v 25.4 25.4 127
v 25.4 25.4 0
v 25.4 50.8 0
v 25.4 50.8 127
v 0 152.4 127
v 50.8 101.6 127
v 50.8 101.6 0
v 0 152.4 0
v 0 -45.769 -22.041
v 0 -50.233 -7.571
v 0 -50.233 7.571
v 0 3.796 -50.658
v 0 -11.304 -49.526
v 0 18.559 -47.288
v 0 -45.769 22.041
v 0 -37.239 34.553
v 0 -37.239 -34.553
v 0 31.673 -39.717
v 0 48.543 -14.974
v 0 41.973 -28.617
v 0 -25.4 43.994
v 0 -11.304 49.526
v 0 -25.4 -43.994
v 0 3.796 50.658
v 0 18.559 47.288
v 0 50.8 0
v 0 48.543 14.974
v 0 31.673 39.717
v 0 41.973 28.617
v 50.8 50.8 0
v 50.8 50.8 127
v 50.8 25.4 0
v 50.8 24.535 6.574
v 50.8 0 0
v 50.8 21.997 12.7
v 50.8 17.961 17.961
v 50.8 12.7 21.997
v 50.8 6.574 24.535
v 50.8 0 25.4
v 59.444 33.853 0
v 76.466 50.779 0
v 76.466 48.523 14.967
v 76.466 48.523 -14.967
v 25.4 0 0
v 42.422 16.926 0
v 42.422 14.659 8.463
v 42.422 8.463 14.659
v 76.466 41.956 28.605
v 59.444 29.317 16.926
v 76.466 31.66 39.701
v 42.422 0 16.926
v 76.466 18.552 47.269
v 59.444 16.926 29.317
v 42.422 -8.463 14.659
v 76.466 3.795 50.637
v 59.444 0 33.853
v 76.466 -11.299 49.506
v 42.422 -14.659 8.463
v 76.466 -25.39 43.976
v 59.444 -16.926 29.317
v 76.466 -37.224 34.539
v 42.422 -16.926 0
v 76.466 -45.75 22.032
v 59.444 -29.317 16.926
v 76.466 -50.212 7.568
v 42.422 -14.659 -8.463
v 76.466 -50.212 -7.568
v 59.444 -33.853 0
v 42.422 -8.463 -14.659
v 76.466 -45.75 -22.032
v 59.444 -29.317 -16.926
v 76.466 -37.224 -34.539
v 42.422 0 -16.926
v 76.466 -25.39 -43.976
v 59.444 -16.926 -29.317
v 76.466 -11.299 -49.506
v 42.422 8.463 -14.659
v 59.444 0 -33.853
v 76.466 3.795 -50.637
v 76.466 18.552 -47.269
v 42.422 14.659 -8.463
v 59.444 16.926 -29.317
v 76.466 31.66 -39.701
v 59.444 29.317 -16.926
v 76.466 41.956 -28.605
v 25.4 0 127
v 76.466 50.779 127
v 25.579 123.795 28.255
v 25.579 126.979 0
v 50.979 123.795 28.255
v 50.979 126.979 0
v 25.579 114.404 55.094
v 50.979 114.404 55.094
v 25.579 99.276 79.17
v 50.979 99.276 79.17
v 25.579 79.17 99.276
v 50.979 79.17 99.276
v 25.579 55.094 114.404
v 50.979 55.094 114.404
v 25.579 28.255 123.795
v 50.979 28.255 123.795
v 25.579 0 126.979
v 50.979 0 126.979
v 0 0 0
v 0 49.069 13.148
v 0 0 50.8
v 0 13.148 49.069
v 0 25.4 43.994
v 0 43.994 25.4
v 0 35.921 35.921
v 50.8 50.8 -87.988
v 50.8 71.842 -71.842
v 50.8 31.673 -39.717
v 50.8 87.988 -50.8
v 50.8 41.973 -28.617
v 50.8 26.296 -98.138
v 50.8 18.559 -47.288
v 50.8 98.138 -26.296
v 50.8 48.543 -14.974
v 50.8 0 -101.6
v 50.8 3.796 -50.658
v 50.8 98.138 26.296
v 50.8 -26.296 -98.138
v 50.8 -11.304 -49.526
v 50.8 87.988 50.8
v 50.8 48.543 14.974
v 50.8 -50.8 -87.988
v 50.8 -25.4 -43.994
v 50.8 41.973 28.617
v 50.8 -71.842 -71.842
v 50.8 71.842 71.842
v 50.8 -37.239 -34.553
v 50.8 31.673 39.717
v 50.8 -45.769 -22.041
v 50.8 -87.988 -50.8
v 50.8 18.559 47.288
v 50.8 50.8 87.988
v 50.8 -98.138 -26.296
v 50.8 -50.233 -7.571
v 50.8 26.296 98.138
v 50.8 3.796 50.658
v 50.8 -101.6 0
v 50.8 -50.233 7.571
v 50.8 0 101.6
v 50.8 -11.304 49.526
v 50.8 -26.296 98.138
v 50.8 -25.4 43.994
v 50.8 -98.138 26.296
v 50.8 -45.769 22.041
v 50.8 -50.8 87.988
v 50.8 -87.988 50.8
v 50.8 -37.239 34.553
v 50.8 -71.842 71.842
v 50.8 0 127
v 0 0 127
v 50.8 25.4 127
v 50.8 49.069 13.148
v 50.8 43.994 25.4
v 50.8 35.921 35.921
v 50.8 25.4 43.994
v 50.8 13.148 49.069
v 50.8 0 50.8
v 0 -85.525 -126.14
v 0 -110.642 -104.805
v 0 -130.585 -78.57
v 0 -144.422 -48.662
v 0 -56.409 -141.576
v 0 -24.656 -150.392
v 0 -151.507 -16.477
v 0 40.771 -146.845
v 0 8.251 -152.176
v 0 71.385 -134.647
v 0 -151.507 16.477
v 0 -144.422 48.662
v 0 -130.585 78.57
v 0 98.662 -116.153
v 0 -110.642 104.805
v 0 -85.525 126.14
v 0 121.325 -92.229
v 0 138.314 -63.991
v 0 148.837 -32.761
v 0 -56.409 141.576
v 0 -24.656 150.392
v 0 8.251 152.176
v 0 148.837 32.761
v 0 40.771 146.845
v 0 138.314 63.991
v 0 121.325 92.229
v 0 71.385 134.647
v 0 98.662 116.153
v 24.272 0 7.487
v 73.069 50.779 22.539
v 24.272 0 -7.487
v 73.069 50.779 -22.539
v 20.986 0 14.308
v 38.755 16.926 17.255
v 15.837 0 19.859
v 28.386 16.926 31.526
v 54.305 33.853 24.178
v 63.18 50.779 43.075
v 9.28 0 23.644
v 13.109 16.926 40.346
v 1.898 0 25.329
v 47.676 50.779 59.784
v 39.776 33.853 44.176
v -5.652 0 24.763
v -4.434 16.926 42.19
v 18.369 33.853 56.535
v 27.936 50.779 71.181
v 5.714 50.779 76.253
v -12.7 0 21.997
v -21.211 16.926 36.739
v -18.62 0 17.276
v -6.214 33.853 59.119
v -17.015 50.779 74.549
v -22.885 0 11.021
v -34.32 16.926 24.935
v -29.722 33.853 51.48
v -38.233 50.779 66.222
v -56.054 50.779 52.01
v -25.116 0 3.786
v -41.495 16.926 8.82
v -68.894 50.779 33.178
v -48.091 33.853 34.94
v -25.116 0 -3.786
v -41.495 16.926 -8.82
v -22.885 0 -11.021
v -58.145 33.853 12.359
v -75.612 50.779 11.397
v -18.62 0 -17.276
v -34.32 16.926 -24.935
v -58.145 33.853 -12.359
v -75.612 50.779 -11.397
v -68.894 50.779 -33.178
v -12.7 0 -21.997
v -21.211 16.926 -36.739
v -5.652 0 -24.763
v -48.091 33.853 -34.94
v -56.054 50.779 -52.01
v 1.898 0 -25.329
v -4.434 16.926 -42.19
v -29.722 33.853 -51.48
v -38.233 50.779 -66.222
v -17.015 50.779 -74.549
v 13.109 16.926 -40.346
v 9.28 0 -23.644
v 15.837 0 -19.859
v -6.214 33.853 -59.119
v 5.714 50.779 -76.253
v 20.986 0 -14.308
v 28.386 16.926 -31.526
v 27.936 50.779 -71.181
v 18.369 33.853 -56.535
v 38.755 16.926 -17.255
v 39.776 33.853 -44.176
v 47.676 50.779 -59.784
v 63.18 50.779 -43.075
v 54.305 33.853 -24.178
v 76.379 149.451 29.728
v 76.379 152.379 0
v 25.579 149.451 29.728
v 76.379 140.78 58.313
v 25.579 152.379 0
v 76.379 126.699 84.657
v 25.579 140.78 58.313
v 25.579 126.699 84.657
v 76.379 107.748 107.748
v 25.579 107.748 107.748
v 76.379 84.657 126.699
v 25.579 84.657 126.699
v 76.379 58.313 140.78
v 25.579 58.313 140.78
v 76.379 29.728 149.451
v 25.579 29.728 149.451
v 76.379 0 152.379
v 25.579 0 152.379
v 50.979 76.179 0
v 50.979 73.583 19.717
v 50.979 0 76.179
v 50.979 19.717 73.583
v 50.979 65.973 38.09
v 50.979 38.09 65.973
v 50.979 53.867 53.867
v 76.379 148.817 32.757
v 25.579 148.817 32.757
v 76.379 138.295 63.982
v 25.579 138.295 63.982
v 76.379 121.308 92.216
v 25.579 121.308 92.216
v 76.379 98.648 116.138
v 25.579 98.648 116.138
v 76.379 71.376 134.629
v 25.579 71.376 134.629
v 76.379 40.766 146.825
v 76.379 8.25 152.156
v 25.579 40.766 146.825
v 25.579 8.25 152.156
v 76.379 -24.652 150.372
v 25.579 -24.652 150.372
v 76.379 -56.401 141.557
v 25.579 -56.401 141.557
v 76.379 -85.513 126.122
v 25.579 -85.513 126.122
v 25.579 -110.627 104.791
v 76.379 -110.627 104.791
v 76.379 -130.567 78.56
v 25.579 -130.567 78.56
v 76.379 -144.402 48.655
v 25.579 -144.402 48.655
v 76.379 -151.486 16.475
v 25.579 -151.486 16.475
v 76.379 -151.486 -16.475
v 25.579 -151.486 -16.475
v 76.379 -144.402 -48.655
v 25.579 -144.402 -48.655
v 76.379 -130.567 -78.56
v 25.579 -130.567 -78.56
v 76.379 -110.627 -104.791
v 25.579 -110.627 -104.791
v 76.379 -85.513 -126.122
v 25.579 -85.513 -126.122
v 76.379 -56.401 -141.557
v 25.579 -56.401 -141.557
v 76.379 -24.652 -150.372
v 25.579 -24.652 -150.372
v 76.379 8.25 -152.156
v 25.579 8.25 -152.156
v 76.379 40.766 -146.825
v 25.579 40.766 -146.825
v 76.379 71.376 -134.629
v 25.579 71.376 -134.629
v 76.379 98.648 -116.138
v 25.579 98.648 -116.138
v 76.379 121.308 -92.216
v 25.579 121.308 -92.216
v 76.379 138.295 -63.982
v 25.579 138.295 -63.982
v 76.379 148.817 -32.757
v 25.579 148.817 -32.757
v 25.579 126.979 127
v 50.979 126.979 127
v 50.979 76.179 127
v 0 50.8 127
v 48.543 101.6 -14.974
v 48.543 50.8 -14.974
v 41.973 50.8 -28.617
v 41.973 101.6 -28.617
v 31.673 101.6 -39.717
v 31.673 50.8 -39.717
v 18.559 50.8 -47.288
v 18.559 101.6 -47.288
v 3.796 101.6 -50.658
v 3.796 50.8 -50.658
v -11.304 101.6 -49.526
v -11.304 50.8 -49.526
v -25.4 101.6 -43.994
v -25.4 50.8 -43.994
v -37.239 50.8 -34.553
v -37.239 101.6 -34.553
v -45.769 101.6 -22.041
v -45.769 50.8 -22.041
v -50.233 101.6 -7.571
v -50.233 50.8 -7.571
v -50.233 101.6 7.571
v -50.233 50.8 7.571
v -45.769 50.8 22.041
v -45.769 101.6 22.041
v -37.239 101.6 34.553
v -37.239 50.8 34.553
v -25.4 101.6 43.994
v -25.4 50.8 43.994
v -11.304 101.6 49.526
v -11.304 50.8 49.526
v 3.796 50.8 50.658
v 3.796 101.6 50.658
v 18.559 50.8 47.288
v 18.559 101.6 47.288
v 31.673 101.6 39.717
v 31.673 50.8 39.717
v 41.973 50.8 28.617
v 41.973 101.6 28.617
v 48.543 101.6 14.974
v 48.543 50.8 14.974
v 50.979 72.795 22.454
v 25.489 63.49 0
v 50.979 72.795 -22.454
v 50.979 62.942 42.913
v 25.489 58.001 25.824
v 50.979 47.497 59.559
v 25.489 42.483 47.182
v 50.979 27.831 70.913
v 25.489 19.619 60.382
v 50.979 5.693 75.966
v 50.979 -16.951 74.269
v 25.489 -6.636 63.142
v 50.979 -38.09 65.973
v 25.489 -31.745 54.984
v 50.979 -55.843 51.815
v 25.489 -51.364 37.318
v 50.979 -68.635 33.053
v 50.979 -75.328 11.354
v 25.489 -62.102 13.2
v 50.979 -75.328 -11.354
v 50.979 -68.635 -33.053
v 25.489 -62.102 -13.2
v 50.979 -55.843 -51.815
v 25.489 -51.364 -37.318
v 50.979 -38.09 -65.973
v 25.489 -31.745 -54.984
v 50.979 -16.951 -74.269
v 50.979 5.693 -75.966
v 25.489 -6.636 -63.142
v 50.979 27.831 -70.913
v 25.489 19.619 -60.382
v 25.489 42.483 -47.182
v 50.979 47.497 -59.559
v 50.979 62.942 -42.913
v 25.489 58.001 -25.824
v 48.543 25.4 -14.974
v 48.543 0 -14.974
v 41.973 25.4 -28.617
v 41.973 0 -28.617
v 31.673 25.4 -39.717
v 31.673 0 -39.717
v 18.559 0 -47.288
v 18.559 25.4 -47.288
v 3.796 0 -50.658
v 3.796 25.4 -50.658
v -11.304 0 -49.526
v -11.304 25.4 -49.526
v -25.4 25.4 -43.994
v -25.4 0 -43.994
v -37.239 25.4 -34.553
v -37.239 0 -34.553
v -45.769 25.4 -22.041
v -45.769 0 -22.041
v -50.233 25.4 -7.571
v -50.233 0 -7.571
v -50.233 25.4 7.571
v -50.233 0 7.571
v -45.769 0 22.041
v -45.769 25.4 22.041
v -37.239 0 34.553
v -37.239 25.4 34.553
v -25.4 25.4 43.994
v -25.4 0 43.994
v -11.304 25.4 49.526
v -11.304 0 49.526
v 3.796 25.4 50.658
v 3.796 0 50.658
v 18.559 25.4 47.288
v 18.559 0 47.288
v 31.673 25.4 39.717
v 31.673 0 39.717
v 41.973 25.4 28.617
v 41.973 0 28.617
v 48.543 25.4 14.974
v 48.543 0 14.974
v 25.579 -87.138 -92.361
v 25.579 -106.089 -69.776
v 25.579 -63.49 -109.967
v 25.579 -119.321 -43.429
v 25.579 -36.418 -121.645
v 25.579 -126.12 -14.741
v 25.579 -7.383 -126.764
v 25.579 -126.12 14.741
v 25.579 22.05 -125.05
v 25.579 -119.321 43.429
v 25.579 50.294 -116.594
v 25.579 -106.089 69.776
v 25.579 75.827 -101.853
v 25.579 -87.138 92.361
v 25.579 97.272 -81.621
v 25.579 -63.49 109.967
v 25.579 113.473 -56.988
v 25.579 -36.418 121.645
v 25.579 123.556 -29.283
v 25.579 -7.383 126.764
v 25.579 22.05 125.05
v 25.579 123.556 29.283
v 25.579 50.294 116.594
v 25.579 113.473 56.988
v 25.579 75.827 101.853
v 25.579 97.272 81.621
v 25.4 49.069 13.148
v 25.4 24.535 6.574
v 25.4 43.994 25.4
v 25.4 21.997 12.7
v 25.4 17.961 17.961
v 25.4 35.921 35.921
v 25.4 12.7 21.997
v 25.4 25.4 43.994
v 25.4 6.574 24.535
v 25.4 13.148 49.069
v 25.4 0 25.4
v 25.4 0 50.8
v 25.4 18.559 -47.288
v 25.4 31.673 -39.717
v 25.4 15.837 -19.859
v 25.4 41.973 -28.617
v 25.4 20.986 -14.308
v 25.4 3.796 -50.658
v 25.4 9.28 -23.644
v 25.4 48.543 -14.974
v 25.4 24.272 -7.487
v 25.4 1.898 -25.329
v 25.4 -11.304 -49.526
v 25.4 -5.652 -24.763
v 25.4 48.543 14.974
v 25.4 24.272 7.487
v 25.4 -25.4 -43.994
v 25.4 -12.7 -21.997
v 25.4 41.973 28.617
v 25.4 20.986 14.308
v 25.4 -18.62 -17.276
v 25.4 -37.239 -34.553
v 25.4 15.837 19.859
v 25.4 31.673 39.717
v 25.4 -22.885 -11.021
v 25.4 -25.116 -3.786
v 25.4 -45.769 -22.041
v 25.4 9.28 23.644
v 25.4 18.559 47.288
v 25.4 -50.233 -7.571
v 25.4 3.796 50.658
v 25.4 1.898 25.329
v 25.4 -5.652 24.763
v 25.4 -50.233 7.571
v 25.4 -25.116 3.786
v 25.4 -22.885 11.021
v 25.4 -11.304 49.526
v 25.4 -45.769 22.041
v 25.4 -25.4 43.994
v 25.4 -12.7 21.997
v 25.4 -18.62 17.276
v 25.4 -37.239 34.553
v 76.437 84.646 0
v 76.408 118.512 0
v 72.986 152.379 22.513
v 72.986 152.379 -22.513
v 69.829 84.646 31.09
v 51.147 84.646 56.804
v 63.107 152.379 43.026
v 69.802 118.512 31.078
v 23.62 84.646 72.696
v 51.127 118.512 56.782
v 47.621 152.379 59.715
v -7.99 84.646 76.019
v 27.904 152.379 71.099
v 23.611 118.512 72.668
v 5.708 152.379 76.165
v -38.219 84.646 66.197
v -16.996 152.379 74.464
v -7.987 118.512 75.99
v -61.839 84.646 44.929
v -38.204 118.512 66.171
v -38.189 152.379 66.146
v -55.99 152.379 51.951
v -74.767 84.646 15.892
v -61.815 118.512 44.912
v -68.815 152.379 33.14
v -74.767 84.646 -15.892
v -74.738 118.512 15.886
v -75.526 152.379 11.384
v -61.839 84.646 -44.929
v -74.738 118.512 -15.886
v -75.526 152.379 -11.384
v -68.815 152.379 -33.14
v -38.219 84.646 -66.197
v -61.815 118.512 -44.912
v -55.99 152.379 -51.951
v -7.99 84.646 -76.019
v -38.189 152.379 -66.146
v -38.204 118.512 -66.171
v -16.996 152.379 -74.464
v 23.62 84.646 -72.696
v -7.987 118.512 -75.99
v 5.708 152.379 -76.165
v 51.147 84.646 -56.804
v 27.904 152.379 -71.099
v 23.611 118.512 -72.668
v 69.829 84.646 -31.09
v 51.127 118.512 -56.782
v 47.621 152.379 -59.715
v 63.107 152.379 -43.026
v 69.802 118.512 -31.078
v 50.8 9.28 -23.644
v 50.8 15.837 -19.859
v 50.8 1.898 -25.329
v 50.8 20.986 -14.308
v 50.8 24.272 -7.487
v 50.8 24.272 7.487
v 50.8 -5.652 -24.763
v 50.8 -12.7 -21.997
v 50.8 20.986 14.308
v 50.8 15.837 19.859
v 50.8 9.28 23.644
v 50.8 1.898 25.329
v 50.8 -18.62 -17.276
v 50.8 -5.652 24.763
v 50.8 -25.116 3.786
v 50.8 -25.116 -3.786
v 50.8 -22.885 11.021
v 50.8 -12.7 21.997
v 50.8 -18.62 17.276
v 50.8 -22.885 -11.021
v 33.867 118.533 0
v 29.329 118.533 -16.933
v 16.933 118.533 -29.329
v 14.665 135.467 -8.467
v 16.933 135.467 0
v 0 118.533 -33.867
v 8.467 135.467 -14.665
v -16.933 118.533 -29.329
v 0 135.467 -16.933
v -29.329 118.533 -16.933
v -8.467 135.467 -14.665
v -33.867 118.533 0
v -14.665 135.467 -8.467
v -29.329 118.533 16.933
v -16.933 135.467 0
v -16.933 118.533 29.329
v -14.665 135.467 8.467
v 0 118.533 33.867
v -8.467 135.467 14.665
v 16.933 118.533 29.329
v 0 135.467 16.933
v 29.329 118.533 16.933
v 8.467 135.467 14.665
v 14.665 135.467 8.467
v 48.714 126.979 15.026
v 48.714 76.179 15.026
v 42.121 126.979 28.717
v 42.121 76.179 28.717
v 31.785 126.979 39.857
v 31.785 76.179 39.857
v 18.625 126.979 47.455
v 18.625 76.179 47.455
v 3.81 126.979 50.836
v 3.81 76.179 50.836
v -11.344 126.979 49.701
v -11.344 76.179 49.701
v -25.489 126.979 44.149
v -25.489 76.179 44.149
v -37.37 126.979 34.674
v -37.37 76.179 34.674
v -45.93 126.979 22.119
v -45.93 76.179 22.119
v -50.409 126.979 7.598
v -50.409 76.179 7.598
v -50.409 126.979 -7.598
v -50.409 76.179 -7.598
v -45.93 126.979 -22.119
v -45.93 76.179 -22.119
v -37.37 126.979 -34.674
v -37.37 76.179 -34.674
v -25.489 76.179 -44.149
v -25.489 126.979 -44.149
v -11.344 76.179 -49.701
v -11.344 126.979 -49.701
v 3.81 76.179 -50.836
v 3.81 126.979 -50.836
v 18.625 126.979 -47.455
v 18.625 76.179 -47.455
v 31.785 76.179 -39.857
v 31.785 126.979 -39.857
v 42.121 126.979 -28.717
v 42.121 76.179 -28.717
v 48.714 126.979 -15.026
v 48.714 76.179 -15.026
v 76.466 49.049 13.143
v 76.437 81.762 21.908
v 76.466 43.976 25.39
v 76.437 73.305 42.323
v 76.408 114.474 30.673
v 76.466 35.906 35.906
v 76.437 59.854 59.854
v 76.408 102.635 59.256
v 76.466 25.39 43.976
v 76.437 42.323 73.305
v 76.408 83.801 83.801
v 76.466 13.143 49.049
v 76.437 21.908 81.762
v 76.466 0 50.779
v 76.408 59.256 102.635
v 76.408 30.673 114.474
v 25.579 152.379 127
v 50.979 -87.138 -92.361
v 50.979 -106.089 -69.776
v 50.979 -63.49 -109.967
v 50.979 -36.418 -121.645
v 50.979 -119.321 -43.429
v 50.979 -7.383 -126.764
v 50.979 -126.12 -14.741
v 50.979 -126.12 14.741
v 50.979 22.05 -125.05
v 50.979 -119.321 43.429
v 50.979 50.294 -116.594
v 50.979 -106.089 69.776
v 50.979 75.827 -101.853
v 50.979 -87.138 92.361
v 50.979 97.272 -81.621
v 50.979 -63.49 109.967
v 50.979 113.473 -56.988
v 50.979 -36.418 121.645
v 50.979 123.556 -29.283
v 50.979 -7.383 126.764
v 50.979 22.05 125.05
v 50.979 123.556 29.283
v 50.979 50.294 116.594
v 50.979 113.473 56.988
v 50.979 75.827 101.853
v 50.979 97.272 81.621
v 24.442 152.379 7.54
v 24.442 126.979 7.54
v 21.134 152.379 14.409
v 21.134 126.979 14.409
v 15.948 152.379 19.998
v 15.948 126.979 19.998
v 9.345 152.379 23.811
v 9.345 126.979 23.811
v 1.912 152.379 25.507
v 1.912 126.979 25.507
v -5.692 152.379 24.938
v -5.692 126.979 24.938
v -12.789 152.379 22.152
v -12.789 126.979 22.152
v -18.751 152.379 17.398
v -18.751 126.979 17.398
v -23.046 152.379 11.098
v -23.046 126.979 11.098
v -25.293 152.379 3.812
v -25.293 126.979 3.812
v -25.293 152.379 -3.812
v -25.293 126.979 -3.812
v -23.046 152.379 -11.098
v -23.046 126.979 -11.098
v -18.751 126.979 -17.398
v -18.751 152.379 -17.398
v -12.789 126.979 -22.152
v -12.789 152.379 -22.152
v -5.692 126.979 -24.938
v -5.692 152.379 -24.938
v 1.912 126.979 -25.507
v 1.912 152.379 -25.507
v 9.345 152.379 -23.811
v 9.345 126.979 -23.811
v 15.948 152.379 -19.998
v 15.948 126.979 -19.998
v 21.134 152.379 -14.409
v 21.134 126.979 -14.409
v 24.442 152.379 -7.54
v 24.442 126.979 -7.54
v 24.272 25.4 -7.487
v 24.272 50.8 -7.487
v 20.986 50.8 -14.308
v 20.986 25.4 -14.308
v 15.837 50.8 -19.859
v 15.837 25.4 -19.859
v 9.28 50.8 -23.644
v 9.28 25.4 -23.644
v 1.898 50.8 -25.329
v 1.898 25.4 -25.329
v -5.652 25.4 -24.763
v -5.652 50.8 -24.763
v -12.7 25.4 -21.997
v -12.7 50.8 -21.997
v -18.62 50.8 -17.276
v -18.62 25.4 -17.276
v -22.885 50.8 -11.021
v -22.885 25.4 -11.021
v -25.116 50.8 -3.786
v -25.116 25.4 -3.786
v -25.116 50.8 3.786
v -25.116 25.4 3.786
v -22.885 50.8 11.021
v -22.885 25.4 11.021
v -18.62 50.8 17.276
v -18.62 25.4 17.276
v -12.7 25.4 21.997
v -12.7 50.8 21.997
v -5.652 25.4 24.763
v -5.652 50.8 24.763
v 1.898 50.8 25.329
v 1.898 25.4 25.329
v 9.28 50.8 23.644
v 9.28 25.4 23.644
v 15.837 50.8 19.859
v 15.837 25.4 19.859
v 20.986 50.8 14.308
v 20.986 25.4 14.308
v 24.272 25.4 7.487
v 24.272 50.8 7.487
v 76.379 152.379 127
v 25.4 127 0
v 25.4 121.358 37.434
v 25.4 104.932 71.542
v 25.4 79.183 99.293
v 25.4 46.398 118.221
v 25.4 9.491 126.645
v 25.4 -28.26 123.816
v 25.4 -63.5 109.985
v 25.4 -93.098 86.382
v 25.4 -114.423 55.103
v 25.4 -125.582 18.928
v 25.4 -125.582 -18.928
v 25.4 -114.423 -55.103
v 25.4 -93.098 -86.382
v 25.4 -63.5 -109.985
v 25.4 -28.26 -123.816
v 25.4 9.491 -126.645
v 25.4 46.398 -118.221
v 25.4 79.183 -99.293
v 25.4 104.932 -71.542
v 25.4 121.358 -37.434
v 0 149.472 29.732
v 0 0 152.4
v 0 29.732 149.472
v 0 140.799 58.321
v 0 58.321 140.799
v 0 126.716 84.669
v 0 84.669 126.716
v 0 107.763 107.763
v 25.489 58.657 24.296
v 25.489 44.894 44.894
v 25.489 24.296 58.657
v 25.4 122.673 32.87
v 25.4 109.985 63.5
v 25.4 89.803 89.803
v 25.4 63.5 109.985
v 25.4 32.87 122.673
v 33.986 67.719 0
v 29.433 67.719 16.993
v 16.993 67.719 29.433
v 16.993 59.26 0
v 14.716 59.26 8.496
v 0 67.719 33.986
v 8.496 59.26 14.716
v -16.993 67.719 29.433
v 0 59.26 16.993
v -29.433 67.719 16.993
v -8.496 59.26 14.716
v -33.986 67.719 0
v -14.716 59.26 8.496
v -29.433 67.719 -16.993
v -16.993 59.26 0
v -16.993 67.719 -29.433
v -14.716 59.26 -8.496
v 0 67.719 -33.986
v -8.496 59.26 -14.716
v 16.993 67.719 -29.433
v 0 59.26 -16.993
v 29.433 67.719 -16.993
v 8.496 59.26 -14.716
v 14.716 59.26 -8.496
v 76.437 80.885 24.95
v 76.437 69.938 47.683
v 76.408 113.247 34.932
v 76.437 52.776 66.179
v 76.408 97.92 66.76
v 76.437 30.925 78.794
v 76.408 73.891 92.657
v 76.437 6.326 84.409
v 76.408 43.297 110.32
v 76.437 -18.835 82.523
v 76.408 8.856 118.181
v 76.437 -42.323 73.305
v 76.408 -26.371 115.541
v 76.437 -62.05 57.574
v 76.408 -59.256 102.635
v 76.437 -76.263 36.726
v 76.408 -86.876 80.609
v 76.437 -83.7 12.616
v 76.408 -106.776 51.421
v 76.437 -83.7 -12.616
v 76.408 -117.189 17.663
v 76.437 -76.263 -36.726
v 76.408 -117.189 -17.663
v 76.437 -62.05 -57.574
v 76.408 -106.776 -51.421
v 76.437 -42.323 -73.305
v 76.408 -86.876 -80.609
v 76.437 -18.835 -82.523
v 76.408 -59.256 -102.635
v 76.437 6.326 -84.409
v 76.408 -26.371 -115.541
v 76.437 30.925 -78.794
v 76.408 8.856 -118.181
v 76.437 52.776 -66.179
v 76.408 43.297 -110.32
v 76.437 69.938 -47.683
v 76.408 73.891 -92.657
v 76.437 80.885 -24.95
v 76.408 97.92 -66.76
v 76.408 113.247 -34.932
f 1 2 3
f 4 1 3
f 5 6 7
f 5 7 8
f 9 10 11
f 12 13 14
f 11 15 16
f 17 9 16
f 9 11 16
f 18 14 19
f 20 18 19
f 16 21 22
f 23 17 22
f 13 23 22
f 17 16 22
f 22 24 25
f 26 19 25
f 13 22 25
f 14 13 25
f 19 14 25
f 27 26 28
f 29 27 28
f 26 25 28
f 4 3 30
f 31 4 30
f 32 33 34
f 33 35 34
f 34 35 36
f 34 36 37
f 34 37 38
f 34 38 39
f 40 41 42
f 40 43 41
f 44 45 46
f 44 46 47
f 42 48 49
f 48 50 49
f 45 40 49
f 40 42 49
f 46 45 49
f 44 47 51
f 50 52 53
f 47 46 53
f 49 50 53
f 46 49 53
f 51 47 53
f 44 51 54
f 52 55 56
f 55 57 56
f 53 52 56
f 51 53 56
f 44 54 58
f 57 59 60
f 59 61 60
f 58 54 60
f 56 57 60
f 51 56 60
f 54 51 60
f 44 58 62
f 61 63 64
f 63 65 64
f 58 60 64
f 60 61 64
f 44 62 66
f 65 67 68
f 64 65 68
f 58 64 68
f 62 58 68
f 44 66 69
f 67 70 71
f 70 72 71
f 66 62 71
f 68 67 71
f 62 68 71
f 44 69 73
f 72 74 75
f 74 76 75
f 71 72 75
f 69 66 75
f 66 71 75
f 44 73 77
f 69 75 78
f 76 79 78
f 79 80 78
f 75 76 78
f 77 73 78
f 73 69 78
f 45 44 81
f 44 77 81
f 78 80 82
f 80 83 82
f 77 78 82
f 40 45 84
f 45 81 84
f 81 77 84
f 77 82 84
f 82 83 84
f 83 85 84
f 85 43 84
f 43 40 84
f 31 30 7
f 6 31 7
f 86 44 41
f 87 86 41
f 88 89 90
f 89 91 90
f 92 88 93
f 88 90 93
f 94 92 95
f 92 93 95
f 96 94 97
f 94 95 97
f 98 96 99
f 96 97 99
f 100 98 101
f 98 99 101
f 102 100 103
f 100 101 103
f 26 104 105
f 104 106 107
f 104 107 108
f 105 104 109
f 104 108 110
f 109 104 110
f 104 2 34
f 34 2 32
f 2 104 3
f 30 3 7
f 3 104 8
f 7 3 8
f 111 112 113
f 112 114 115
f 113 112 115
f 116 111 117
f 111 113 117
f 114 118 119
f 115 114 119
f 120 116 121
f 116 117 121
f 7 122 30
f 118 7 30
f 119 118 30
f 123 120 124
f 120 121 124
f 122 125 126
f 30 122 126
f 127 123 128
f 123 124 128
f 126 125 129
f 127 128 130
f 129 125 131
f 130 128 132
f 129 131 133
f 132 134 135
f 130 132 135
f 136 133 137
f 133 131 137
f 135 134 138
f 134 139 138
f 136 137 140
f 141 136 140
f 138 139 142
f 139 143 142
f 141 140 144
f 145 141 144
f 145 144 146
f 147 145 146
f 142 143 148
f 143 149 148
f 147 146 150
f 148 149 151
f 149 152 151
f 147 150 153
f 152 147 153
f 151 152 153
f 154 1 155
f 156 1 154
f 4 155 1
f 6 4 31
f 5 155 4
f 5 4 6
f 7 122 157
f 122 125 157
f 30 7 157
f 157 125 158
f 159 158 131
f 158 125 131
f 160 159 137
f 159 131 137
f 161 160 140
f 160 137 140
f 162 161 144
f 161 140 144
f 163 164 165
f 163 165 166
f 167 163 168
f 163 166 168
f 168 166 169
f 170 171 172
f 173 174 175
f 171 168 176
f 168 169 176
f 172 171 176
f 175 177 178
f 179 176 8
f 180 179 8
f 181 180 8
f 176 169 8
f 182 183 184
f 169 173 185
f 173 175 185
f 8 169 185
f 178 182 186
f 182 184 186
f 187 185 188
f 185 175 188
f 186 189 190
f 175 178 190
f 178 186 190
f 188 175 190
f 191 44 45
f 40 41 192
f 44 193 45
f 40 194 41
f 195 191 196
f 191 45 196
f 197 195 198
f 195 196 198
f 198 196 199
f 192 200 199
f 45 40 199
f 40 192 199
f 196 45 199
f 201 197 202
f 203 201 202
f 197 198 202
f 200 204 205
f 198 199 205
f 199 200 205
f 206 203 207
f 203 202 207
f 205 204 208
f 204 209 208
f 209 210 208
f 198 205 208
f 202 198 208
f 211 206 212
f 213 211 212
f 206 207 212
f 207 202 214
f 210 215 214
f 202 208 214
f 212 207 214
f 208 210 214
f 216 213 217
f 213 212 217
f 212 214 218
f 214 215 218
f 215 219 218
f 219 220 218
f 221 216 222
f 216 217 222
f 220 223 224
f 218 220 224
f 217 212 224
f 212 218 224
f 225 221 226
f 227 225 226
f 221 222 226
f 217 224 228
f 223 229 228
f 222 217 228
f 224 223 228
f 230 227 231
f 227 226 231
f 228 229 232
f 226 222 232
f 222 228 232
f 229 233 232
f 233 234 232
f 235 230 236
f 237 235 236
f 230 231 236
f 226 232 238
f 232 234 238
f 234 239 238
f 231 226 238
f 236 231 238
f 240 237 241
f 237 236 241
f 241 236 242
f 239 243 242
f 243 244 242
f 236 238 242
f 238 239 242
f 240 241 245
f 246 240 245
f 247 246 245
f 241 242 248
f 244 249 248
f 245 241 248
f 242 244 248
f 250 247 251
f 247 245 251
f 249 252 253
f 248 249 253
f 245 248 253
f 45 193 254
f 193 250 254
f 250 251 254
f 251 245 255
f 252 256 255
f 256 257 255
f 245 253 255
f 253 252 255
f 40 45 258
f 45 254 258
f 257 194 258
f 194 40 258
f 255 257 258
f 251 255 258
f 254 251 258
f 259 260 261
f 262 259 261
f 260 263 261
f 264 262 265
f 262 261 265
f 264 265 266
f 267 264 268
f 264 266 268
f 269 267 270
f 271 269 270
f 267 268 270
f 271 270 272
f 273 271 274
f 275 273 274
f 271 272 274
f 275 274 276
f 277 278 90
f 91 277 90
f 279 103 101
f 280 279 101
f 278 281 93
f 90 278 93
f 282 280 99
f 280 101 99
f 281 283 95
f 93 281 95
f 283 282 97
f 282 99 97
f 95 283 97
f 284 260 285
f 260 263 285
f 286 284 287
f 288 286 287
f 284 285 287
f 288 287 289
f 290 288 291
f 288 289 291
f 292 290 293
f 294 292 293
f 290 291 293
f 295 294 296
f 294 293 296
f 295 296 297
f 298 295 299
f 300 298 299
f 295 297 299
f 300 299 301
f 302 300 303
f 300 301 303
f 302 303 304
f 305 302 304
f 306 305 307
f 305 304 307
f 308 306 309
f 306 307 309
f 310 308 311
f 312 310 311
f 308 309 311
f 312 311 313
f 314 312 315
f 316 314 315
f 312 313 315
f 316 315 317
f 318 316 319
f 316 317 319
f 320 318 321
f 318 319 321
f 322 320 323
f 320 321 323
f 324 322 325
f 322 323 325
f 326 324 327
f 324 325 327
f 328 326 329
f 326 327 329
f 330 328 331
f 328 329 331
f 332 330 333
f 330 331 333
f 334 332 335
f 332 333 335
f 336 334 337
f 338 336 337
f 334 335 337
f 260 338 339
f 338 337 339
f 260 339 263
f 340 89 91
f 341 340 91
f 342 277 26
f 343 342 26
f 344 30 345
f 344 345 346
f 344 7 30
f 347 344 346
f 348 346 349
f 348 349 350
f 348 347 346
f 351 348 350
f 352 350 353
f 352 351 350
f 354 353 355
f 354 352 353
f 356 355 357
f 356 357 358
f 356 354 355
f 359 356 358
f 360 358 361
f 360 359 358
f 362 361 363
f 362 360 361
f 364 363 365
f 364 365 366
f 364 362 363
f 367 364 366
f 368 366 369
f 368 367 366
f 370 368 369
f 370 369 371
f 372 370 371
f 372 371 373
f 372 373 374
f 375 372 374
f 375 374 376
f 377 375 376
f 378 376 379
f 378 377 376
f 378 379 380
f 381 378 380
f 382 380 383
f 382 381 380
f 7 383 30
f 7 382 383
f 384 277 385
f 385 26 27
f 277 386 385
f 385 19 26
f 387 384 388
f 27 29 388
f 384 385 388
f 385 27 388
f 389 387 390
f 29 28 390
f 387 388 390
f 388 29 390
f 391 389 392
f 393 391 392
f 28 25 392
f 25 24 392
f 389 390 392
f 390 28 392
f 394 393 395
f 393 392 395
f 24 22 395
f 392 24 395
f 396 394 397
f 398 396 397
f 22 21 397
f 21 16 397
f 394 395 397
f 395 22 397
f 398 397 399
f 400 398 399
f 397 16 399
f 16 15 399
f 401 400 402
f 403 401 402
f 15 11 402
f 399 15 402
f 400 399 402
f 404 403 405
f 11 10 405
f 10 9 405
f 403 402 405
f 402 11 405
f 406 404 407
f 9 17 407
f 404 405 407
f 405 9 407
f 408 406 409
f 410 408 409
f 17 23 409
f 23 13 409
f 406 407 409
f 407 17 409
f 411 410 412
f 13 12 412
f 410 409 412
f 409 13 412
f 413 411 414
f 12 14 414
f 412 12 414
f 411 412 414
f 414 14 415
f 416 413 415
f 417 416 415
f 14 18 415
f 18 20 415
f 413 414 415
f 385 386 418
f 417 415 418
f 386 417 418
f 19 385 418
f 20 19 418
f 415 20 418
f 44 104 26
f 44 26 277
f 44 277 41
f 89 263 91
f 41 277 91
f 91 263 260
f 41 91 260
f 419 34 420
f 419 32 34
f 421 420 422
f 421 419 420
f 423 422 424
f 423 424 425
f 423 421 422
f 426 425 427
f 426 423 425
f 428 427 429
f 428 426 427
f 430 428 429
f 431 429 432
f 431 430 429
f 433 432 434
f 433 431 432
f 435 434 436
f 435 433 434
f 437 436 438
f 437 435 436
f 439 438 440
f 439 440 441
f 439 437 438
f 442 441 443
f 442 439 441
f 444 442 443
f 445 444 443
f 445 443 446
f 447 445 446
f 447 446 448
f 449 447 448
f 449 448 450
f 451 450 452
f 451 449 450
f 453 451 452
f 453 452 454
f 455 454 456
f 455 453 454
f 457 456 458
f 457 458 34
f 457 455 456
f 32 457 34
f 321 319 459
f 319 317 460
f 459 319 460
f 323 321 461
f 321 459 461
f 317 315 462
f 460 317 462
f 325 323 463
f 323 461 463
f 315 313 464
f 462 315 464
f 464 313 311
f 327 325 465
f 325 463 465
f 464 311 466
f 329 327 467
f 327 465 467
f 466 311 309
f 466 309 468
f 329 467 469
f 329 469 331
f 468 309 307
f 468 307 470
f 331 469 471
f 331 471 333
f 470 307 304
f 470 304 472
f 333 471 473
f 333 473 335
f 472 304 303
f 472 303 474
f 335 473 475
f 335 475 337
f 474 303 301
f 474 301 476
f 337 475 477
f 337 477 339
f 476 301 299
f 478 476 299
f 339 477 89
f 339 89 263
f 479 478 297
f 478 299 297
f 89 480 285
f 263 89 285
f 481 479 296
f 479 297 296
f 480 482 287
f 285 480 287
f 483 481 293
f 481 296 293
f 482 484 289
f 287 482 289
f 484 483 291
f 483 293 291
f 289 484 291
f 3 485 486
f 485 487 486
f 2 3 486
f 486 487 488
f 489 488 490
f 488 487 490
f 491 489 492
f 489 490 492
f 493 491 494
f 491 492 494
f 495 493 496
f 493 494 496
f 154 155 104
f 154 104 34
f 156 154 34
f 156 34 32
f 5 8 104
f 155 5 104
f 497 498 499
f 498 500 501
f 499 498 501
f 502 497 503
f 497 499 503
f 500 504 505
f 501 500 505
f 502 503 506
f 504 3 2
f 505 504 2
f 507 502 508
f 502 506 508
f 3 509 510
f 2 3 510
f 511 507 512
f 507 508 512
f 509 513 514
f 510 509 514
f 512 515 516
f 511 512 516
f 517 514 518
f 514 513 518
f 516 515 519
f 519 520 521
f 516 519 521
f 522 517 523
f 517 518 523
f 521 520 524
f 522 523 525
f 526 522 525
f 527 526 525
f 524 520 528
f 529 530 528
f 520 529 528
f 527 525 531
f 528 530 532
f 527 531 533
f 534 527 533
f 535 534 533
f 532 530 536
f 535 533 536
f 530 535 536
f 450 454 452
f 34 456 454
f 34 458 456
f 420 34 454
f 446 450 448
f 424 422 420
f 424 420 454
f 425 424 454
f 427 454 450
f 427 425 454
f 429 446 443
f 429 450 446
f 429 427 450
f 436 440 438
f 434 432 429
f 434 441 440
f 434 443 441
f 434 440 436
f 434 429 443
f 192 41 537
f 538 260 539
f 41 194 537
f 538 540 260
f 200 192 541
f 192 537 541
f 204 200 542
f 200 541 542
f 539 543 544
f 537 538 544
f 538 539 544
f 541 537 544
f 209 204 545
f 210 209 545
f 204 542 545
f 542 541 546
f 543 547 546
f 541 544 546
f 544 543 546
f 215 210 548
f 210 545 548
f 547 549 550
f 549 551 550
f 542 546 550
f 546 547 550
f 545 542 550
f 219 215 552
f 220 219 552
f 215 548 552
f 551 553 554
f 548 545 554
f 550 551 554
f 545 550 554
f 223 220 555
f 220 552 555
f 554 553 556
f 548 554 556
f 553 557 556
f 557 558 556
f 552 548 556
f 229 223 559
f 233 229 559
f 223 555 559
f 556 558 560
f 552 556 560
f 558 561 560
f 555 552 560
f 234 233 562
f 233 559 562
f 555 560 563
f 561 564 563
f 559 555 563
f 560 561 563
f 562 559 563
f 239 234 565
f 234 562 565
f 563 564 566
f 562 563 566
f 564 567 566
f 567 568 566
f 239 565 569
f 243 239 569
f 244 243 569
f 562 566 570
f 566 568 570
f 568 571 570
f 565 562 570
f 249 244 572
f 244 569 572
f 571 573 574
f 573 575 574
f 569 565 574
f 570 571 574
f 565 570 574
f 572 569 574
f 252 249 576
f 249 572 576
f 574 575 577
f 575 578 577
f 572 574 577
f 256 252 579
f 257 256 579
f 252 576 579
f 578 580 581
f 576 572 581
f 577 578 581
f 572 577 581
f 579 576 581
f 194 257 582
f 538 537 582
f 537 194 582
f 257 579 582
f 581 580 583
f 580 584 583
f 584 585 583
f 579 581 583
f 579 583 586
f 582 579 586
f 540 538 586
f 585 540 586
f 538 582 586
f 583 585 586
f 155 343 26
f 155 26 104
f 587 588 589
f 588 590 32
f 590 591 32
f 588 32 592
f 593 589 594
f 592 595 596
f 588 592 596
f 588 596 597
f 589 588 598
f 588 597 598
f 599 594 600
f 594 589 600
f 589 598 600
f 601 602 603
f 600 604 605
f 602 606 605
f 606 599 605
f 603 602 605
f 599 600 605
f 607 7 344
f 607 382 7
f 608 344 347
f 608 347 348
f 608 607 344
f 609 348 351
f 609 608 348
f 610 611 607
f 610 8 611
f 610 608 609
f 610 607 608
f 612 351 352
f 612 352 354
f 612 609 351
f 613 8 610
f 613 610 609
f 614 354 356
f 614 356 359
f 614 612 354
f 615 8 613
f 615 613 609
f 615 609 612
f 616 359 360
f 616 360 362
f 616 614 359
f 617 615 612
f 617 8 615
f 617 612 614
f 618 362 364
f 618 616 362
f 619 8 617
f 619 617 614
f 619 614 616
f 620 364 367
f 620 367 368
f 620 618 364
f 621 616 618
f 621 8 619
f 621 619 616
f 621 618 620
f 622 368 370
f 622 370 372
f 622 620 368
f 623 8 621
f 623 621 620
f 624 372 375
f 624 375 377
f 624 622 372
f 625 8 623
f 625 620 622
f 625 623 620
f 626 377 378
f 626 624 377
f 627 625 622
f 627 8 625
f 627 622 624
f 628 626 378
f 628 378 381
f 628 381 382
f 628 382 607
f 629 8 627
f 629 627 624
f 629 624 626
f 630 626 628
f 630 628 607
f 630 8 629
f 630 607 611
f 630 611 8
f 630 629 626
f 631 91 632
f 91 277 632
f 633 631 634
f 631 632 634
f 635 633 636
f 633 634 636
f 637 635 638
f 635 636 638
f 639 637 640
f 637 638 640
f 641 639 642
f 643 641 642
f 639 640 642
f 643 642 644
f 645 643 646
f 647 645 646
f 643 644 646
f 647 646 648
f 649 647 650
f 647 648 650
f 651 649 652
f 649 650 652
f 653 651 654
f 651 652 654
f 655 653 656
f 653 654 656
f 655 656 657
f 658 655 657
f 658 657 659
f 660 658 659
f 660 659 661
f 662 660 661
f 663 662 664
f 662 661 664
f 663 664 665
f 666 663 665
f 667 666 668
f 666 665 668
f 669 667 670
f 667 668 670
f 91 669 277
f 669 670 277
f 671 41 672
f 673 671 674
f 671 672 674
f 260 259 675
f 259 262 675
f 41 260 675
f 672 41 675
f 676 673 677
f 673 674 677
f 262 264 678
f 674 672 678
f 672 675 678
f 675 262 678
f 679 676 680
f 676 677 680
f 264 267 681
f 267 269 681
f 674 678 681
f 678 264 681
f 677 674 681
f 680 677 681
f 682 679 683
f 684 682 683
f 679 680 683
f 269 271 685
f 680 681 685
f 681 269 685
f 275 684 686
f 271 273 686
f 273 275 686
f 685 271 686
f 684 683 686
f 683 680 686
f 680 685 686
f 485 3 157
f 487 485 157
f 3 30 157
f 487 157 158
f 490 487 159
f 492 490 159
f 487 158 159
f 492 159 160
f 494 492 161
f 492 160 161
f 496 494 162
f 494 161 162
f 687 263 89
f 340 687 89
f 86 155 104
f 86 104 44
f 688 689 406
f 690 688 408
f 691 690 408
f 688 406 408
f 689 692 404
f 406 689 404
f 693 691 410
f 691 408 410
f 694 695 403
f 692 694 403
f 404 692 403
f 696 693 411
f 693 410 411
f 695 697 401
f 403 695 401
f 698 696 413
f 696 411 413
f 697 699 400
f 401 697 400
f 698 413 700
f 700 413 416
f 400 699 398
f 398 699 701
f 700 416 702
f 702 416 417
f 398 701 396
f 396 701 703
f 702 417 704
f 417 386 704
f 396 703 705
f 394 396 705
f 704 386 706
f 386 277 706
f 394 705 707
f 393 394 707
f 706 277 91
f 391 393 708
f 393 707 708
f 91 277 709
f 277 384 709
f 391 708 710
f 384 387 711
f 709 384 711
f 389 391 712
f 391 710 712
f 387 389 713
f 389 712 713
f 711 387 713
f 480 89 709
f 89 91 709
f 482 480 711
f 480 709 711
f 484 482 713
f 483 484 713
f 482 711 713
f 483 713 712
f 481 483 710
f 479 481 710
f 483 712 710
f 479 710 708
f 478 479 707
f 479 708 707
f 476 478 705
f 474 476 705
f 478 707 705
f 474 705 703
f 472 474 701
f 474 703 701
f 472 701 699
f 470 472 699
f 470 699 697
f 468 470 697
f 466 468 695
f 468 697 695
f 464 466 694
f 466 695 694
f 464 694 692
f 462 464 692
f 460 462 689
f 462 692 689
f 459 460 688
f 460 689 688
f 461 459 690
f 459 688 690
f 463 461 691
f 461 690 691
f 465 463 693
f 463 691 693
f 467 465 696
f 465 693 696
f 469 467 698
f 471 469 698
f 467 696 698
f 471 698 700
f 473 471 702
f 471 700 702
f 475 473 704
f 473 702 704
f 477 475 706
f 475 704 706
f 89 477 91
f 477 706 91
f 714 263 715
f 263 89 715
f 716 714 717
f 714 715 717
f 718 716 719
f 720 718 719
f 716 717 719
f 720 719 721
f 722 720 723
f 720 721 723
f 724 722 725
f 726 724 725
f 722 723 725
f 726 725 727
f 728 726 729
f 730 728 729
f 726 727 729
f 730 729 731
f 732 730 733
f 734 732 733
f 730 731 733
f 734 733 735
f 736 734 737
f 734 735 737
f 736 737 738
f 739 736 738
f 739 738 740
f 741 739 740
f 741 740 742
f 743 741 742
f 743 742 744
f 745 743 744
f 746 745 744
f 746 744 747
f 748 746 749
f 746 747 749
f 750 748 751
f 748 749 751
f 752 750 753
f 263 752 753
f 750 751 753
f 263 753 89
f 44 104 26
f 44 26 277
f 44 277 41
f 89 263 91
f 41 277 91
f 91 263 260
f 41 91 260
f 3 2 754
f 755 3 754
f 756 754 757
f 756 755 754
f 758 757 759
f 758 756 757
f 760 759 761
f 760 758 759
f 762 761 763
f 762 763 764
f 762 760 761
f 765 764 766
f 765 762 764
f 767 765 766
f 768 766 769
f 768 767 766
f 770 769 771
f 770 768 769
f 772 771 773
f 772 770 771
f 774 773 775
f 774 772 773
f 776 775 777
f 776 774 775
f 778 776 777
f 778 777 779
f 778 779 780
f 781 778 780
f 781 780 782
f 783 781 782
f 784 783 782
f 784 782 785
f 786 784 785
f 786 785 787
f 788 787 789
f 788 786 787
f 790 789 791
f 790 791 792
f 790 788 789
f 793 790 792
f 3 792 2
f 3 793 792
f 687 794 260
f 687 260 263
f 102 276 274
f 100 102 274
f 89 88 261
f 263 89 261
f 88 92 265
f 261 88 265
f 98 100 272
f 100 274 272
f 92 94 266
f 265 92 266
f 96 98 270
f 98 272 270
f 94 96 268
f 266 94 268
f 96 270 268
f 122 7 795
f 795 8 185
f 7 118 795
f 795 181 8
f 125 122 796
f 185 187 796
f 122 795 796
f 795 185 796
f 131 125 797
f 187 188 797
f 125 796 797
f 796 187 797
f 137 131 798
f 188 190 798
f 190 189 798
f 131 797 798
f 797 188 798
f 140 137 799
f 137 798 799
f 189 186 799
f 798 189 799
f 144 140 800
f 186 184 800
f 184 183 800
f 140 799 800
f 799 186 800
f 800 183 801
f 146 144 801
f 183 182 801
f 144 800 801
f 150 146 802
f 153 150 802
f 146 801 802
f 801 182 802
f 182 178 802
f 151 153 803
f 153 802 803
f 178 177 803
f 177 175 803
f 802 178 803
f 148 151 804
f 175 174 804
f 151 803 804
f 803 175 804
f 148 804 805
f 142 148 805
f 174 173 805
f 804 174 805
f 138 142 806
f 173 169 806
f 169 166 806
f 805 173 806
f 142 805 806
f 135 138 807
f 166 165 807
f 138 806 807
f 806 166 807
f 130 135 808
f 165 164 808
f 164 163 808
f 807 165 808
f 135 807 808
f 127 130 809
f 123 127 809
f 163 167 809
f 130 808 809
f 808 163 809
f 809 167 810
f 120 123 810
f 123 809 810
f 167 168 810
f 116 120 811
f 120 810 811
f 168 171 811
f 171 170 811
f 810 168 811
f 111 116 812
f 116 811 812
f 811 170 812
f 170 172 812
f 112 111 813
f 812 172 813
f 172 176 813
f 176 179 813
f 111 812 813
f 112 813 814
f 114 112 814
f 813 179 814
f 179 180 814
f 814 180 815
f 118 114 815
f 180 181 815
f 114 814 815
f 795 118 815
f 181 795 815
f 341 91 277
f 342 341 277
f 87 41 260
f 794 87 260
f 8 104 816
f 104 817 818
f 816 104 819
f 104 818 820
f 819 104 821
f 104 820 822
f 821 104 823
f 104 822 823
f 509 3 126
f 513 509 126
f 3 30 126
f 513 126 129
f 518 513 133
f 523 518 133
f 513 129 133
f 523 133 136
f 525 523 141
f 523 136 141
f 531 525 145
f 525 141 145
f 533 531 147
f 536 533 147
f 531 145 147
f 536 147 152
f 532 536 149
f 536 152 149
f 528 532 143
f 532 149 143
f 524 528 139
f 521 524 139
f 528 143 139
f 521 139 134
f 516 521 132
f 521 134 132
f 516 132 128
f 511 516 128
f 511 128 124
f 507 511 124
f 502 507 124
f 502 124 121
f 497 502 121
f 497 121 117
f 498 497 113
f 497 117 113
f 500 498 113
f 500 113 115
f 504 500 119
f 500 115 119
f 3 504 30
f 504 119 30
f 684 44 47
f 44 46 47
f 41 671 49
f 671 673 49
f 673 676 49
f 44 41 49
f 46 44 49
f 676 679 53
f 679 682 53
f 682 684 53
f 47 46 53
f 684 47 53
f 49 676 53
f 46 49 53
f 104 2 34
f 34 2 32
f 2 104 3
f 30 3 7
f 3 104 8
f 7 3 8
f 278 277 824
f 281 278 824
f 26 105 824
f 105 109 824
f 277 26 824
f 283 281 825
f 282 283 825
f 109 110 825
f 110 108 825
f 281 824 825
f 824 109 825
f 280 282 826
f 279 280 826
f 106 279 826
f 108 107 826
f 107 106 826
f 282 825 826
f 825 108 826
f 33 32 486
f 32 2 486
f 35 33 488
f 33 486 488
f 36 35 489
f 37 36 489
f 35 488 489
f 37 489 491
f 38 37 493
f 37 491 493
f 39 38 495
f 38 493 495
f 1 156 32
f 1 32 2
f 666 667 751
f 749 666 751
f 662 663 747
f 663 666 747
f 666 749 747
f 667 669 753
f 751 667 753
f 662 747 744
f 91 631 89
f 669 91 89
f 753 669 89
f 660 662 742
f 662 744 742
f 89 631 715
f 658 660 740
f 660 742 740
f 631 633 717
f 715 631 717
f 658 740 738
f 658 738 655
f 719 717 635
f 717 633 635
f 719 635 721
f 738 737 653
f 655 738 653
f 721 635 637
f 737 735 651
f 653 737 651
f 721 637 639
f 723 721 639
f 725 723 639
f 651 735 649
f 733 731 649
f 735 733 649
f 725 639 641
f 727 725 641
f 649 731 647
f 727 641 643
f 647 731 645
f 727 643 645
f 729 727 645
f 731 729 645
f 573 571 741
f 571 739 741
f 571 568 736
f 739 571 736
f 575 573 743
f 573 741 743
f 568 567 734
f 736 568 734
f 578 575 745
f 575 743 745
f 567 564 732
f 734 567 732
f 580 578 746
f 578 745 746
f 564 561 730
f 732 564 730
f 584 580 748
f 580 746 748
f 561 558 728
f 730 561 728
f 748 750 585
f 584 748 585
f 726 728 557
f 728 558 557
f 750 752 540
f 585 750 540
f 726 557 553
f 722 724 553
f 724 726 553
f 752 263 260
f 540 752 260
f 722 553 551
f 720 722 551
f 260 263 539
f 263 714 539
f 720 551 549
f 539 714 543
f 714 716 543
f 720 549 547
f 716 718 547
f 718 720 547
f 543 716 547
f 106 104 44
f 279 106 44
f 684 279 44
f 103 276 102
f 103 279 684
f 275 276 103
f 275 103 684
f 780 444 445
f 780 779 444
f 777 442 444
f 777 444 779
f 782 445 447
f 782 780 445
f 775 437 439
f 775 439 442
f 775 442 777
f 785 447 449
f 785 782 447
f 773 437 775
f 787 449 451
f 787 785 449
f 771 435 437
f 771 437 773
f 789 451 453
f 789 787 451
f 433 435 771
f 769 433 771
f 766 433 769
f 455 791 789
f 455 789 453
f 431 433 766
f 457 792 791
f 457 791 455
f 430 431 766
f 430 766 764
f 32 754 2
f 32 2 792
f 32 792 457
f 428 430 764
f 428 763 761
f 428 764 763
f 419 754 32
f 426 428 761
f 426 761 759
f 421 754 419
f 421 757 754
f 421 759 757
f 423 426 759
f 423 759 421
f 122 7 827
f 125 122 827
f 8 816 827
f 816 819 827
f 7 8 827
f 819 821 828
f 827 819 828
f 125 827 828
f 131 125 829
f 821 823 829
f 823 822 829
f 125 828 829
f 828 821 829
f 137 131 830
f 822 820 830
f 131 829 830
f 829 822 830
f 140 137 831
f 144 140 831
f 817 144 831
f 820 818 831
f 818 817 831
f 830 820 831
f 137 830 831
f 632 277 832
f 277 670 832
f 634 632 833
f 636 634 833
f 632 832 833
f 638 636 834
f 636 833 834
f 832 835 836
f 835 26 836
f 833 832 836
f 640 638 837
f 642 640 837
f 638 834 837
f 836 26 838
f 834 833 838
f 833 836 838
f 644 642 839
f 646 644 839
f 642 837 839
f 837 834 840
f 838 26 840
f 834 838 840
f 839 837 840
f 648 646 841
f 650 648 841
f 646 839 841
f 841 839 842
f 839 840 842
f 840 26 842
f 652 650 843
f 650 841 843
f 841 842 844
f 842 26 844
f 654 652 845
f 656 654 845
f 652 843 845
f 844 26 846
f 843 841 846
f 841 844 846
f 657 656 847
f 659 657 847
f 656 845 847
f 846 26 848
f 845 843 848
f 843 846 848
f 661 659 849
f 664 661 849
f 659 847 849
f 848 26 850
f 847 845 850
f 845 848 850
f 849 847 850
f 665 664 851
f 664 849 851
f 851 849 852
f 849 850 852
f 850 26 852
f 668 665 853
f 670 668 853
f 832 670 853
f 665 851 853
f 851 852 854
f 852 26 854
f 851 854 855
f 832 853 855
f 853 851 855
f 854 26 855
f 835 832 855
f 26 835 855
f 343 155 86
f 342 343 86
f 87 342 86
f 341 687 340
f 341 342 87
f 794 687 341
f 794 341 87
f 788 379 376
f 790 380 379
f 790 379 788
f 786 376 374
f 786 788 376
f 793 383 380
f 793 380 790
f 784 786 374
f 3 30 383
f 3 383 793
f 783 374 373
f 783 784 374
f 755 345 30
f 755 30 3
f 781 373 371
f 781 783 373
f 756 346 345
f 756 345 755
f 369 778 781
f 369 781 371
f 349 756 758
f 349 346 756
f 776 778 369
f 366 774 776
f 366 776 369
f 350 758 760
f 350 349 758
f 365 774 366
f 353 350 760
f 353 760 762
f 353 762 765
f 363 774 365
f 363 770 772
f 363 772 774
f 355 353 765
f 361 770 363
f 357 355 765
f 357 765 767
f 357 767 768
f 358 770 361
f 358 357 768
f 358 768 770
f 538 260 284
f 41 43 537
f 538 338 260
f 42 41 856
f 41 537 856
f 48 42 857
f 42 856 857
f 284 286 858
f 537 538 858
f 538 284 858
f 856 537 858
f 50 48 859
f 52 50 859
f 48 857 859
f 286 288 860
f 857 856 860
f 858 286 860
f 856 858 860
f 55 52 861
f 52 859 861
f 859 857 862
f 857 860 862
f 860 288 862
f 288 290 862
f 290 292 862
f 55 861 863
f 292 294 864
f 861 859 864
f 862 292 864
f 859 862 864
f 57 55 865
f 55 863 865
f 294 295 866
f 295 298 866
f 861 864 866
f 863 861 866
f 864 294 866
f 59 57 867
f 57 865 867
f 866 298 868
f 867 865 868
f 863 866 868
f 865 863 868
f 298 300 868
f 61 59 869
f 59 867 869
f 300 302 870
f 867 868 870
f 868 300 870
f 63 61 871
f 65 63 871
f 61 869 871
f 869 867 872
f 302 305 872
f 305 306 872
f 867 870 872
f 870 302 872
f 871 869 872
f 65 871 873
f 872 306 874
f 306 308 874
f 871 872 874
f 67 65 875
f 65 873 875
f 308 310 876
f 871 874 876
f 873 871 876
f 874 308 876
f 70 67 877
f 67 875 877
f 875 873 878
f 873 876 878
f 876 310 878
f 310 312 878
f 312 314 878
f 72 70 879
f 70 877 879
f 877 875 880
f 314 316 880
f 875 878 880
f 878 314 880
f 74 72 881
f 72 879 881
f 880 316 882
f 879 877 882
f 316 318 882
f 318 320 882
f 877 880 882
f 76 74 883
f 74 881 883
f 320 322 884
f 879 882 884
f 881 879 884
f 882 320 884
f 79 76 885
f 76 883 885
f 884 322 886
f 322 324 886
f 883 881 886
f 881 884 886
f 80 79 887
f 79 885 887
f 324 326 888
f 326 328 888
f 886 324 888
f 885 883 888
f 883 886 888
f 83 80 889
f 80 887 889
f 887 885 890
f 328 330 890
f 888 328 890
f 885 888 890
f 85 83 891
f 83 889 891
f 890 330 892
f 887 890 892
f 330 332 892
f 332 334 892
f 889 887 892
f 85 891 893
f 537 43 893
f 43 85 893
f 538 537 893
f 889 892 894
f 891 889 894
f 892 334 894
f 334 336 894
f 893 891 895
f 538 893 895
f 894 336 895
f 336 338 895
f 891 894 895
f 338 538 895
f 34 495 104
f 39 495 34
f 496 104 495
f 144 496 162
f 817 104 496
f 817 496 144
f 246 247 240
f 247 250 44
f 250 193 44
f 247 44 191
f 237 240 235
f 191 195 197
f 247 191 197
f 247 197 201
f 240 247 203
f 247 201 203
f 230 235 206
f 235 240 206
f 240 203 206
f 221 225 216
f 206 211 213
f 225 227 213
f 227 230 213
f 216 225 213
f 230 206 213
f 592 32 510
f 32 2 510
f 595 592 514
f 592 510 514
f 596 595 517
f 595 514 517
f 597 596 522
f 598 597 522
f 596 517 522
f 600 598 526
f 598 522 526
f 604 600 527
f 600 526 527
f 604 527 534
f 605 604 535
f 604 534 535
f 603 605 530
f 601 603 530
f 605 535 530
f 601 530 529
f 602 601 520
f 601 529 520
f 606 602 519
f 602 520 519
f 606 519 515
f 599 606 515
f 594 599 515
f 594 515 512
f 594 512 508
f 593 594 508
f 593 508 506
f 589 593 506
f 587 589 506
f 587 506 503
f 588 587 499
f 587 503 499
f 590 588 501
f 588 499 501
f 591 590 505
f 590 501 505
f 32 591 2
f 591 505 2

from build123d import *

# Parameters (mm, degrees)
F1_DEPTH = 127
F4_ANGLE = 90
F6_DEPTH = 127
F9_ANGLE = 90


with BuildPart() as f1:
    # F0 (on Top) → F1 (new body)
    with BuildSketch(Plane.XY):
        Polygon((0, 152.4), (0, 0), (50.8, 0), (50.8, 25.4), (25.4, 25.4), (25.4, 50.8), (50.8, 50.8), (50.8, 101.6), align=None)
    extrude(amount=F1_DEPTH)


with BuildPart() as f2:
    # F0 (on Top) → F2 (revolve)
    with BuildSketch(Plane.XY):
        Polygon((0, 152.4), (0, 0), (50.8, 0), (50.8, 25.4), (25.4, 25.4), (25.4, 50.8), (50.8, 50.8), (50.8, 101.6), align=None)
    revolve(axis=Axis((25.4, 0, 0), (1, 0, 0)))


with BuildPart() as f3:
    # F0 (on Top) → F3 (revolve)
    with BuildSketch(Plane.XY):
        Polygon((0, 152.4), (0, 0), (50.8, 0), (50.8, 25.4), (25.4, 25.4), (25.4, 50.8), (50.8, 50.8), (50.8, 101.6), align=None)
    revolve(axis=Axis((0, 76.2, 0), (0, 1, 0)))


with BuildPart() as f4:
    # F0 (on Top) → F4 (revolve)
    with BuildSketch(Plane.XY):
        Polygon((0, 152.4), (0, 0), (50.8, 0), (50.8, 25.4), (25.4, 25.4), (25.4, 50.8), (50.8, 50.8), (50.8, 101.6), align=None)
    revolve(axis=Axis((25.4, 0, 0), (1, 0, 0)), revolution_arc=F4_ANGLE)


with BuildPart() as f6:
    # F5 (on Top) → F6 (new body)
    with BuildSketch(Plane.XY):
        Polygon((50.9788915515, 76.1790499091), (0, 50.8), (0, 0), (25.4, 0), (76.4664423498, 50.7790876313), (76.3788915515, 152.3790499091), (25.5788915515, 152.3790499091), (25.5788915515, 126.9790499091), (50.9788915515, 126.9790499091), align=None)
    extrude(amount=F6_DEPTH)


with BuildPart() as f7:
    # F5 (on Top) → F7 (revolve)
    with BuildSketch(Plane.XY):
        Polygon((50.9788915515, 76.1790499091), (0, 50.8), (0, 0), (25.4, 0), (76.4664423498, 50.7790876313), (76.3788915515, 152.3790499091), (25.5788915515, 152.3790499091), (25.5788915515, 126.9790499091), (50.9788915515, 126.9790499091), align=None)
    revolve(axis=Axis((0, 25.4, 0), (0, -1, 0)))


with BuildPart() as f8:
    # F5 (on Top) → F8 (revolve)
    with BuildSketch(Plane.XY):
        Polygon((50.9788915515, 76.1790499091), (0, 50.8), (0, 0), (25.4, 0), (76.4664423498, 50.7790876313), (76.3788915515, 152.3790499091), (25.5788915515, 152.3790499091), (25.5788915515, 126.9790499091), (50.9788915515, 126.9790499091), align=None)
    revolve(axis=Axis((12.7, 0, 0), (1, 0, 0)))


with BuildPart() as f9:
    # F5 (on Top) → F9 (revolve)
    with BuildSketch(Plane.XY):
        Polygon((50.9788915515, 76.1790499091), (0, 50.8), (0, 0), (25.4, 0), (76.4664423498, 50.7790876313), (76.3788915515, 152.3790499091), (25.5788915515, 152.3790499091), (25.5788915515, 126.9790499091), (50.9788915515, 126.9790499091), align=None)
    revolve(axis=Axis((12.7, 0, 0), (1, 0, 0)), revolution_arc=F9_ANGLE)


solid = Compound([f1.part, f2.part, f3.part, f4.part, f6.part, f7.part, f8.part, f9.part])
